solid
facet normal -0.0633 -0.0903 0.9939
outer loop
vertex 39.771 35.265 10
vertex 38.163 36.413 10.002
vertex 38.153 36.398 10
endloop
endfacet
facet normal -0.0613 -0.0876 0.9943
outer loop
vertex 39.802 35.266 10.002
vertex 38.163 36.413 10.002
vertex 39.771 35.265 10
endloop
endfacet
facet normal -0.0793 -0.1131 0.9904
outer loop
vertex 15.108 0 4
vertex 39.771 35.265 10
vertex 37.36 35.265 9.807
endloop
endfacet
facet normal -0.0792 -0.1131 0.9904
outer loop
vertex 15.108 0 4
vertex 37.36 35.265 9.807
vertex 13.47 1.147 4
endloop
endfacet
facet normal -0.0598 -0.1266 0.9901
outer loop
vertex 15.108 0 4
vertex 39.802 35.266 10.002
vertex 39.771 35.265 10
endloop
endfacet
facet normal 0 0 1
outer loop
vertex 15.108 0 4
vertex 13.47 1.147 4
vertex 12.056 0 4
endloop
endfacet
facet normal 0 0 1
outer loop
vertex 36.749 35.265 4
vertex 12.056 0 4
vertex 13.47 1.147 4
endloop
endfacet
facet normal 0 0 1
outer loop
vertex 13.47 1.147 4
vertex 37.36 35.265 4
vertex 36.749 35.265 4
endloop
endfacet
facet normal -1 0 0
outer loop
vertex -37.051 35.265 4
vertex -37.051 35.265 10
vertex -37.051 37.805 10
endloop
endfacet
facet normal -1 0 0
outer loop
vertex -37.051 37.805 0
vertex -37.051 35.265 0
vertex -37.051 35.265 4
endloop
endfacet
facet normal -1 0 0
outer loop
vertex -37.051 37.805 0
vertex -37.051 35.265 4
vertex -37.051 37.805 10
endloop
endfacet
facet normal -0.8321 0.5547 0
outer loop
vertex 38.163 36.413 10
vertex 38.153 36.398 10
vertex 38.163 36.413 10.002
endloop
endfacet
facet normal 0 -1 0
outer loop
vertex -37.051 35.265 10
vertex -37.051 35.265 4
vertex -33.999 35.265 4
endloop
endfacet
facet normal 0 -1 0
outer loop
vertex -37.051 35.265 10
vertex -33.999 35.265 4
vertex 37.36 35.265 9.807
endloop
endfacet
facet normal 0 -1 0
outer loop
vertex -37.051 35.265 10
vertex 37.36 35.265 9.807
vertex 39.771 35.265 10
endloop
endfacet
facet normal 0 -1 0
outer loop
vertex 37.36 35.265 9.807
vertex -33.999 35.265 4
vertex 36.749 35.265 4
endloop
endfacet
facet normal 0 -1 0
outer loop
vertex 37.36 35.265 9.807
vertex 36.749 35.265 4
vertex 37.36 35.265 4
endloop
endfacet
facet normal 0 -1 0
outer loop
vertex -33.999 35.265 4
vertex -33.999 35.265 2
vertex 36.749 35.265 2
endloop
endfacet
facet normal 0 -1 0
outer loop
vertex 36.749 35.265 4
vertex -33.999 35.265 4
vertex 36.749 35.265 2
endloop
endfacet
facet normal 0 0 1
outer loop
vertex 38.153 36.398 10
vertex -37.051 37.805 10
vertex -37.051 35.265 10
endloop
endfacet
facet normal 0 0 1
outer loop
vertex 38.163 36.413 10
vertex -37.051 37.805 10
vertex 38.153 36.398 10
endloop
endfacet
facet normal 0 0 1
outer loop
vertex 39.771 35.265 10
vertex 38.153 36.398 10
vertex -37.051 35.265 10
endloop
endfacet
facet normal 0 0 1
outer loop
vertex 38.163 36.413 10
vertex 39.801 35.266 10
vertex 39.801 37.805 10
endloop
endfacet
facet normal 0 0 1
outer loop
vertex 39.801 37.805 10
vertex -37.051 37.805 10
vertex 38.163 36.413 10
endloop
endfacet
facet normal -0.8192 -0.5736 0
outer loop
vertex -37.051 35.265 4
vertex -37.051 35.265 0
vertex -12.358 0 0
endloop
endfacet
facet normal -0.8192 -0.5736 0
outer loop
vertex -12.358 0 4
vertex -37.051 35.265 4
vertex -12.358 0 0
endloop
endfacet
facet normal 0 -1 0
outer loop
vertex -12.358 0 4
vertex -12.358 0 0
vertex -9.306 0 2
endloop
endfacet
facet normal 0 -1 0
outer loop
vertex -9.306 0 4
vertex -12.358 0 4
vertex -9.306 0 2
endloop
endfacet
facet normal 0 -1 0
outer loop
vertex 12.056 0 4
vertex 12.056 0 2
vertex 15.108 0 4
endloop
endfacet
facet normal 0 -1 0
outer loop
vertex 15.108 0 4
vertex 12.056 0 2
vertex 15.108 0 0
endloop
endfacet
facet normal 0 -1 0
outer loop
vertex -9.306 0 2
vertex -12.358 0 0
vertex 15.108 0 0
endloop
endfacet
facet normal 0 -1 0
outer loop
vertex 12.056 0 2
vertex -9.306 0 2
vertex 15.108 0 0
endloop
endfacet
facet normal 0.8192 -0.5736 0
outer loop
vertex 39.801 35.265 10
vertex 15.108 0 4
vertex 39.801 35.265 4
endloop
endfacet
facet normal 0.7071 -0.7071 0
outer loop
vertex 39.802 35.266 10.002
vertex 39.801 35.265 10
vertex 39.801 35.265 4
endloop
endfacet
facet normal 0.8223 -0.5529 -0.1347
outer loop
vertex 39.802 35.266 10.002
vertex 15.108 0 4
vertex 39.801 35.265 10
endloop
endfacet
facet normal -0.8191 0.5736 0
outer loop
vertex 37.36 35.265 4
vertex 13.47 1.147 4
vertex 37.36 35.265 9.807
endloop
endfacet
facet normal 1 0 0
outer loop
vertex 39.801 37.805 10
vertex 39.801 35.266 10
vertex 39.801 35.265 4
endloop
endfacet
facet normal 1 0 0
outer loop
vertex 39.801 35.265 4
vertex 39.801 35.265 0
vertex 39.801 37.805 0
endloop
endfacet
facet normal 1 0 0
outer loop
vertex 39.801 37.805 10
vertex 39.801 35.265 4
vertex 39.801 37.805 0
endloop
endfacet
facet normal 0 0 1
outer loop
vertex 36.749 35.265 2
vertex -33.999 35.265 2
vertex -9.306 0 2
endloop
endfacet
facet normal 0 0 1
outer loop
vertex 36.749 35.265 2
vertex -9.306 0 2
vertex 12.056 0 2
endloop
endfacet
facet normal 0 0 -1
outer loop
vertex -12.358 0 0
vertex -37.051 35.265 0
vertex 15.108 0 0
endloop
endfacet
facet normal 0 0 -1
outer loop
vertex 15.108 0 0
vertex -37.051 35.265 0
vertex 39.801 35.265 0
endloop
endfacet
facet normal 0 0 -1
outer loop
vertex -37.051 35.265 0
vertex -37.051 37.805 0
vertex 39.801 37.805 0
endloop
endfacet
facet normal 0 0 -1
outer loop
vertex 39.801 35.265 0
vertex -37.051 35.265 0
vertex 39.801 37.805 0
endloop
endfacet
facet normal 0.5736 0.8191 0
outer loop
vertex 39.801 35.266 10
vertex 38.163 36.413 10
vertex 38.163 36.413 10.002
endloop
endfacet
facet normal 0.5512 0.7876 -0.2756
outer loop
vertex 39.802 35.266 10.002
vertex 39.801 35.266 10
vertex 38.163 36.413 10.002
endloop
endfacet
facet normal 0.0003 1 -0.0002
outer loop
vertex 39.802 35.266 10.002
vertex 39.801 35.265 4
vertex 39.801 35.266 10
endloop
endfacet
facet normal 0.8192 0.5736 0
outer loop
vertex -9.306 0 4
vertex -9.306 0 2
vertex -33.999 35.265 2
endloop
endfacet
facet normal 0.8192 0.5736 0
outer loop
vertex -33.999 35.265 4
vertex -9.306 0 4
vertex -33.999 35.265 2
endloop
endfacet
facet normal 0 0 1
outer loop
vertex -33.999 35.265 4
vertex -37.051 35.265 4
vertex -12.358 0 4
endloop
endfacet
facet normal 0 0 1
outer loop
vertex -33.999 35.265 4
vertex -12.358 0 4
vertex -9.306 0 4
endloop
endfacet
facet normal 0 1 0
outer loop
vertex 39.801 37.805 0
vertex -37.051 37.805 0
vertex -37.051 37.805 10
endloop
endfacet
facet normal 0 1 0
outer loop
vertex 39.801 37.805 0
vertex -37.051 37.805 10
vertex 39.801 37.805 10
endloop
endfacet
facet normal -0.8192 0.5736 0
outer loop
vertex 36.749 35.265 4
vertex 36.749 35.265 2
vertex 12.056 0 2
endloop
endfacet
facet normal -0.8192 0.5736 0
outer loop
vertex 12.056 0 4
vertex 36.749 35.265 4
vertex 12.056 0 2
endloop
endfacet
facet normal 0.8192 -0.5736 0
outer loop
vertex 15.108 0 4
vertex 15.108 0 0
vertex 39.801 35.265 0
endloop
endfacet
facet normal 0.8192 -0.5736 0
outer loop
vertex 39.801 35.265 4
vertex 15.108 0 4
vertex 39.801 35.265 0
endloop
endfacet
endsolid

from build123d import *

# Parameters (mm, degrees)
F1_DEPTH = 2
F2_DEPTH = 4
F0_W     = 70.7484384206
F0_H     = 2.5396057816
F3_DEPTH = 10
F0_W_2   = 3.0519364719
F4_DEPTH = 10
F6_DEPTH = 2


with BuildPart() as f1:
    # F0 (on Top) → F1 (new body)
    with BuildSketch(Plane.XY):
        Polygon((-33.9991840492, 35.2650536744), (-9.306327631, 0), (12.0563979532, 0), (36.7492543714, 35.2650536744), align=None)
    extrude(amount=F1_DEPTH)

    # F0 (on Top) → F2 (join)
    with BuildSketch(Plane.XY):
        Polygon((-37.0511205211, 35.2650536744), (-12.3582641029, 0), (-9.306327631, 0), (-33.9991840492, 35.2650536744), align=None)
        Polygon((36.7492543714, 35.2650536744), (12.0563979532, 0), (15.1083344251, 0), (39.8011908433, 35.2650536744), align=None)
    extrude(amount=F2_DEPTH)



with BuildPart() as f3:
    # F0 (on Top) → F3 (new body)
    with BuildSketch(Plane.XY):
        with Locations((1.3750351611, 36.5348565652)):
            Rectangle(F0_W, F0_H)
    extrude(amount=F3_DEPTH)


with BuildPart() as f1_1:
    add(f1.part)

    add(f3.part)  # F4 merges F3
    # F0 (on Top) → F4 (join)
    with BuildSketch(Plane.XY):
        with Locations((38.2752226073, 36.5348565652)):
            Rectangle(F0_W_2, F0_H)
        with Locations((-35.5251522851, 36.5348565652)):
            Rectangle(F0_W_2, F0_H)
    extrude(amount=F4_DEPTH)

    # F5 (on face) → F6 (join)
    with BuildSketch(Plane(origin=(10.1378445653, -7.0985951858, 0), x_dir=(0.5735764364, 0.8191520443, 0), z_dir=(0.8191520443, -0.5735764364, 0))):
        Polygon((51.7171509564, 10.0024873391), (8.6657846187, 4), (51.7164660158, 4), align=None)
    extrude(amount=-F6_DEPTH)


solid = f1_1.part
